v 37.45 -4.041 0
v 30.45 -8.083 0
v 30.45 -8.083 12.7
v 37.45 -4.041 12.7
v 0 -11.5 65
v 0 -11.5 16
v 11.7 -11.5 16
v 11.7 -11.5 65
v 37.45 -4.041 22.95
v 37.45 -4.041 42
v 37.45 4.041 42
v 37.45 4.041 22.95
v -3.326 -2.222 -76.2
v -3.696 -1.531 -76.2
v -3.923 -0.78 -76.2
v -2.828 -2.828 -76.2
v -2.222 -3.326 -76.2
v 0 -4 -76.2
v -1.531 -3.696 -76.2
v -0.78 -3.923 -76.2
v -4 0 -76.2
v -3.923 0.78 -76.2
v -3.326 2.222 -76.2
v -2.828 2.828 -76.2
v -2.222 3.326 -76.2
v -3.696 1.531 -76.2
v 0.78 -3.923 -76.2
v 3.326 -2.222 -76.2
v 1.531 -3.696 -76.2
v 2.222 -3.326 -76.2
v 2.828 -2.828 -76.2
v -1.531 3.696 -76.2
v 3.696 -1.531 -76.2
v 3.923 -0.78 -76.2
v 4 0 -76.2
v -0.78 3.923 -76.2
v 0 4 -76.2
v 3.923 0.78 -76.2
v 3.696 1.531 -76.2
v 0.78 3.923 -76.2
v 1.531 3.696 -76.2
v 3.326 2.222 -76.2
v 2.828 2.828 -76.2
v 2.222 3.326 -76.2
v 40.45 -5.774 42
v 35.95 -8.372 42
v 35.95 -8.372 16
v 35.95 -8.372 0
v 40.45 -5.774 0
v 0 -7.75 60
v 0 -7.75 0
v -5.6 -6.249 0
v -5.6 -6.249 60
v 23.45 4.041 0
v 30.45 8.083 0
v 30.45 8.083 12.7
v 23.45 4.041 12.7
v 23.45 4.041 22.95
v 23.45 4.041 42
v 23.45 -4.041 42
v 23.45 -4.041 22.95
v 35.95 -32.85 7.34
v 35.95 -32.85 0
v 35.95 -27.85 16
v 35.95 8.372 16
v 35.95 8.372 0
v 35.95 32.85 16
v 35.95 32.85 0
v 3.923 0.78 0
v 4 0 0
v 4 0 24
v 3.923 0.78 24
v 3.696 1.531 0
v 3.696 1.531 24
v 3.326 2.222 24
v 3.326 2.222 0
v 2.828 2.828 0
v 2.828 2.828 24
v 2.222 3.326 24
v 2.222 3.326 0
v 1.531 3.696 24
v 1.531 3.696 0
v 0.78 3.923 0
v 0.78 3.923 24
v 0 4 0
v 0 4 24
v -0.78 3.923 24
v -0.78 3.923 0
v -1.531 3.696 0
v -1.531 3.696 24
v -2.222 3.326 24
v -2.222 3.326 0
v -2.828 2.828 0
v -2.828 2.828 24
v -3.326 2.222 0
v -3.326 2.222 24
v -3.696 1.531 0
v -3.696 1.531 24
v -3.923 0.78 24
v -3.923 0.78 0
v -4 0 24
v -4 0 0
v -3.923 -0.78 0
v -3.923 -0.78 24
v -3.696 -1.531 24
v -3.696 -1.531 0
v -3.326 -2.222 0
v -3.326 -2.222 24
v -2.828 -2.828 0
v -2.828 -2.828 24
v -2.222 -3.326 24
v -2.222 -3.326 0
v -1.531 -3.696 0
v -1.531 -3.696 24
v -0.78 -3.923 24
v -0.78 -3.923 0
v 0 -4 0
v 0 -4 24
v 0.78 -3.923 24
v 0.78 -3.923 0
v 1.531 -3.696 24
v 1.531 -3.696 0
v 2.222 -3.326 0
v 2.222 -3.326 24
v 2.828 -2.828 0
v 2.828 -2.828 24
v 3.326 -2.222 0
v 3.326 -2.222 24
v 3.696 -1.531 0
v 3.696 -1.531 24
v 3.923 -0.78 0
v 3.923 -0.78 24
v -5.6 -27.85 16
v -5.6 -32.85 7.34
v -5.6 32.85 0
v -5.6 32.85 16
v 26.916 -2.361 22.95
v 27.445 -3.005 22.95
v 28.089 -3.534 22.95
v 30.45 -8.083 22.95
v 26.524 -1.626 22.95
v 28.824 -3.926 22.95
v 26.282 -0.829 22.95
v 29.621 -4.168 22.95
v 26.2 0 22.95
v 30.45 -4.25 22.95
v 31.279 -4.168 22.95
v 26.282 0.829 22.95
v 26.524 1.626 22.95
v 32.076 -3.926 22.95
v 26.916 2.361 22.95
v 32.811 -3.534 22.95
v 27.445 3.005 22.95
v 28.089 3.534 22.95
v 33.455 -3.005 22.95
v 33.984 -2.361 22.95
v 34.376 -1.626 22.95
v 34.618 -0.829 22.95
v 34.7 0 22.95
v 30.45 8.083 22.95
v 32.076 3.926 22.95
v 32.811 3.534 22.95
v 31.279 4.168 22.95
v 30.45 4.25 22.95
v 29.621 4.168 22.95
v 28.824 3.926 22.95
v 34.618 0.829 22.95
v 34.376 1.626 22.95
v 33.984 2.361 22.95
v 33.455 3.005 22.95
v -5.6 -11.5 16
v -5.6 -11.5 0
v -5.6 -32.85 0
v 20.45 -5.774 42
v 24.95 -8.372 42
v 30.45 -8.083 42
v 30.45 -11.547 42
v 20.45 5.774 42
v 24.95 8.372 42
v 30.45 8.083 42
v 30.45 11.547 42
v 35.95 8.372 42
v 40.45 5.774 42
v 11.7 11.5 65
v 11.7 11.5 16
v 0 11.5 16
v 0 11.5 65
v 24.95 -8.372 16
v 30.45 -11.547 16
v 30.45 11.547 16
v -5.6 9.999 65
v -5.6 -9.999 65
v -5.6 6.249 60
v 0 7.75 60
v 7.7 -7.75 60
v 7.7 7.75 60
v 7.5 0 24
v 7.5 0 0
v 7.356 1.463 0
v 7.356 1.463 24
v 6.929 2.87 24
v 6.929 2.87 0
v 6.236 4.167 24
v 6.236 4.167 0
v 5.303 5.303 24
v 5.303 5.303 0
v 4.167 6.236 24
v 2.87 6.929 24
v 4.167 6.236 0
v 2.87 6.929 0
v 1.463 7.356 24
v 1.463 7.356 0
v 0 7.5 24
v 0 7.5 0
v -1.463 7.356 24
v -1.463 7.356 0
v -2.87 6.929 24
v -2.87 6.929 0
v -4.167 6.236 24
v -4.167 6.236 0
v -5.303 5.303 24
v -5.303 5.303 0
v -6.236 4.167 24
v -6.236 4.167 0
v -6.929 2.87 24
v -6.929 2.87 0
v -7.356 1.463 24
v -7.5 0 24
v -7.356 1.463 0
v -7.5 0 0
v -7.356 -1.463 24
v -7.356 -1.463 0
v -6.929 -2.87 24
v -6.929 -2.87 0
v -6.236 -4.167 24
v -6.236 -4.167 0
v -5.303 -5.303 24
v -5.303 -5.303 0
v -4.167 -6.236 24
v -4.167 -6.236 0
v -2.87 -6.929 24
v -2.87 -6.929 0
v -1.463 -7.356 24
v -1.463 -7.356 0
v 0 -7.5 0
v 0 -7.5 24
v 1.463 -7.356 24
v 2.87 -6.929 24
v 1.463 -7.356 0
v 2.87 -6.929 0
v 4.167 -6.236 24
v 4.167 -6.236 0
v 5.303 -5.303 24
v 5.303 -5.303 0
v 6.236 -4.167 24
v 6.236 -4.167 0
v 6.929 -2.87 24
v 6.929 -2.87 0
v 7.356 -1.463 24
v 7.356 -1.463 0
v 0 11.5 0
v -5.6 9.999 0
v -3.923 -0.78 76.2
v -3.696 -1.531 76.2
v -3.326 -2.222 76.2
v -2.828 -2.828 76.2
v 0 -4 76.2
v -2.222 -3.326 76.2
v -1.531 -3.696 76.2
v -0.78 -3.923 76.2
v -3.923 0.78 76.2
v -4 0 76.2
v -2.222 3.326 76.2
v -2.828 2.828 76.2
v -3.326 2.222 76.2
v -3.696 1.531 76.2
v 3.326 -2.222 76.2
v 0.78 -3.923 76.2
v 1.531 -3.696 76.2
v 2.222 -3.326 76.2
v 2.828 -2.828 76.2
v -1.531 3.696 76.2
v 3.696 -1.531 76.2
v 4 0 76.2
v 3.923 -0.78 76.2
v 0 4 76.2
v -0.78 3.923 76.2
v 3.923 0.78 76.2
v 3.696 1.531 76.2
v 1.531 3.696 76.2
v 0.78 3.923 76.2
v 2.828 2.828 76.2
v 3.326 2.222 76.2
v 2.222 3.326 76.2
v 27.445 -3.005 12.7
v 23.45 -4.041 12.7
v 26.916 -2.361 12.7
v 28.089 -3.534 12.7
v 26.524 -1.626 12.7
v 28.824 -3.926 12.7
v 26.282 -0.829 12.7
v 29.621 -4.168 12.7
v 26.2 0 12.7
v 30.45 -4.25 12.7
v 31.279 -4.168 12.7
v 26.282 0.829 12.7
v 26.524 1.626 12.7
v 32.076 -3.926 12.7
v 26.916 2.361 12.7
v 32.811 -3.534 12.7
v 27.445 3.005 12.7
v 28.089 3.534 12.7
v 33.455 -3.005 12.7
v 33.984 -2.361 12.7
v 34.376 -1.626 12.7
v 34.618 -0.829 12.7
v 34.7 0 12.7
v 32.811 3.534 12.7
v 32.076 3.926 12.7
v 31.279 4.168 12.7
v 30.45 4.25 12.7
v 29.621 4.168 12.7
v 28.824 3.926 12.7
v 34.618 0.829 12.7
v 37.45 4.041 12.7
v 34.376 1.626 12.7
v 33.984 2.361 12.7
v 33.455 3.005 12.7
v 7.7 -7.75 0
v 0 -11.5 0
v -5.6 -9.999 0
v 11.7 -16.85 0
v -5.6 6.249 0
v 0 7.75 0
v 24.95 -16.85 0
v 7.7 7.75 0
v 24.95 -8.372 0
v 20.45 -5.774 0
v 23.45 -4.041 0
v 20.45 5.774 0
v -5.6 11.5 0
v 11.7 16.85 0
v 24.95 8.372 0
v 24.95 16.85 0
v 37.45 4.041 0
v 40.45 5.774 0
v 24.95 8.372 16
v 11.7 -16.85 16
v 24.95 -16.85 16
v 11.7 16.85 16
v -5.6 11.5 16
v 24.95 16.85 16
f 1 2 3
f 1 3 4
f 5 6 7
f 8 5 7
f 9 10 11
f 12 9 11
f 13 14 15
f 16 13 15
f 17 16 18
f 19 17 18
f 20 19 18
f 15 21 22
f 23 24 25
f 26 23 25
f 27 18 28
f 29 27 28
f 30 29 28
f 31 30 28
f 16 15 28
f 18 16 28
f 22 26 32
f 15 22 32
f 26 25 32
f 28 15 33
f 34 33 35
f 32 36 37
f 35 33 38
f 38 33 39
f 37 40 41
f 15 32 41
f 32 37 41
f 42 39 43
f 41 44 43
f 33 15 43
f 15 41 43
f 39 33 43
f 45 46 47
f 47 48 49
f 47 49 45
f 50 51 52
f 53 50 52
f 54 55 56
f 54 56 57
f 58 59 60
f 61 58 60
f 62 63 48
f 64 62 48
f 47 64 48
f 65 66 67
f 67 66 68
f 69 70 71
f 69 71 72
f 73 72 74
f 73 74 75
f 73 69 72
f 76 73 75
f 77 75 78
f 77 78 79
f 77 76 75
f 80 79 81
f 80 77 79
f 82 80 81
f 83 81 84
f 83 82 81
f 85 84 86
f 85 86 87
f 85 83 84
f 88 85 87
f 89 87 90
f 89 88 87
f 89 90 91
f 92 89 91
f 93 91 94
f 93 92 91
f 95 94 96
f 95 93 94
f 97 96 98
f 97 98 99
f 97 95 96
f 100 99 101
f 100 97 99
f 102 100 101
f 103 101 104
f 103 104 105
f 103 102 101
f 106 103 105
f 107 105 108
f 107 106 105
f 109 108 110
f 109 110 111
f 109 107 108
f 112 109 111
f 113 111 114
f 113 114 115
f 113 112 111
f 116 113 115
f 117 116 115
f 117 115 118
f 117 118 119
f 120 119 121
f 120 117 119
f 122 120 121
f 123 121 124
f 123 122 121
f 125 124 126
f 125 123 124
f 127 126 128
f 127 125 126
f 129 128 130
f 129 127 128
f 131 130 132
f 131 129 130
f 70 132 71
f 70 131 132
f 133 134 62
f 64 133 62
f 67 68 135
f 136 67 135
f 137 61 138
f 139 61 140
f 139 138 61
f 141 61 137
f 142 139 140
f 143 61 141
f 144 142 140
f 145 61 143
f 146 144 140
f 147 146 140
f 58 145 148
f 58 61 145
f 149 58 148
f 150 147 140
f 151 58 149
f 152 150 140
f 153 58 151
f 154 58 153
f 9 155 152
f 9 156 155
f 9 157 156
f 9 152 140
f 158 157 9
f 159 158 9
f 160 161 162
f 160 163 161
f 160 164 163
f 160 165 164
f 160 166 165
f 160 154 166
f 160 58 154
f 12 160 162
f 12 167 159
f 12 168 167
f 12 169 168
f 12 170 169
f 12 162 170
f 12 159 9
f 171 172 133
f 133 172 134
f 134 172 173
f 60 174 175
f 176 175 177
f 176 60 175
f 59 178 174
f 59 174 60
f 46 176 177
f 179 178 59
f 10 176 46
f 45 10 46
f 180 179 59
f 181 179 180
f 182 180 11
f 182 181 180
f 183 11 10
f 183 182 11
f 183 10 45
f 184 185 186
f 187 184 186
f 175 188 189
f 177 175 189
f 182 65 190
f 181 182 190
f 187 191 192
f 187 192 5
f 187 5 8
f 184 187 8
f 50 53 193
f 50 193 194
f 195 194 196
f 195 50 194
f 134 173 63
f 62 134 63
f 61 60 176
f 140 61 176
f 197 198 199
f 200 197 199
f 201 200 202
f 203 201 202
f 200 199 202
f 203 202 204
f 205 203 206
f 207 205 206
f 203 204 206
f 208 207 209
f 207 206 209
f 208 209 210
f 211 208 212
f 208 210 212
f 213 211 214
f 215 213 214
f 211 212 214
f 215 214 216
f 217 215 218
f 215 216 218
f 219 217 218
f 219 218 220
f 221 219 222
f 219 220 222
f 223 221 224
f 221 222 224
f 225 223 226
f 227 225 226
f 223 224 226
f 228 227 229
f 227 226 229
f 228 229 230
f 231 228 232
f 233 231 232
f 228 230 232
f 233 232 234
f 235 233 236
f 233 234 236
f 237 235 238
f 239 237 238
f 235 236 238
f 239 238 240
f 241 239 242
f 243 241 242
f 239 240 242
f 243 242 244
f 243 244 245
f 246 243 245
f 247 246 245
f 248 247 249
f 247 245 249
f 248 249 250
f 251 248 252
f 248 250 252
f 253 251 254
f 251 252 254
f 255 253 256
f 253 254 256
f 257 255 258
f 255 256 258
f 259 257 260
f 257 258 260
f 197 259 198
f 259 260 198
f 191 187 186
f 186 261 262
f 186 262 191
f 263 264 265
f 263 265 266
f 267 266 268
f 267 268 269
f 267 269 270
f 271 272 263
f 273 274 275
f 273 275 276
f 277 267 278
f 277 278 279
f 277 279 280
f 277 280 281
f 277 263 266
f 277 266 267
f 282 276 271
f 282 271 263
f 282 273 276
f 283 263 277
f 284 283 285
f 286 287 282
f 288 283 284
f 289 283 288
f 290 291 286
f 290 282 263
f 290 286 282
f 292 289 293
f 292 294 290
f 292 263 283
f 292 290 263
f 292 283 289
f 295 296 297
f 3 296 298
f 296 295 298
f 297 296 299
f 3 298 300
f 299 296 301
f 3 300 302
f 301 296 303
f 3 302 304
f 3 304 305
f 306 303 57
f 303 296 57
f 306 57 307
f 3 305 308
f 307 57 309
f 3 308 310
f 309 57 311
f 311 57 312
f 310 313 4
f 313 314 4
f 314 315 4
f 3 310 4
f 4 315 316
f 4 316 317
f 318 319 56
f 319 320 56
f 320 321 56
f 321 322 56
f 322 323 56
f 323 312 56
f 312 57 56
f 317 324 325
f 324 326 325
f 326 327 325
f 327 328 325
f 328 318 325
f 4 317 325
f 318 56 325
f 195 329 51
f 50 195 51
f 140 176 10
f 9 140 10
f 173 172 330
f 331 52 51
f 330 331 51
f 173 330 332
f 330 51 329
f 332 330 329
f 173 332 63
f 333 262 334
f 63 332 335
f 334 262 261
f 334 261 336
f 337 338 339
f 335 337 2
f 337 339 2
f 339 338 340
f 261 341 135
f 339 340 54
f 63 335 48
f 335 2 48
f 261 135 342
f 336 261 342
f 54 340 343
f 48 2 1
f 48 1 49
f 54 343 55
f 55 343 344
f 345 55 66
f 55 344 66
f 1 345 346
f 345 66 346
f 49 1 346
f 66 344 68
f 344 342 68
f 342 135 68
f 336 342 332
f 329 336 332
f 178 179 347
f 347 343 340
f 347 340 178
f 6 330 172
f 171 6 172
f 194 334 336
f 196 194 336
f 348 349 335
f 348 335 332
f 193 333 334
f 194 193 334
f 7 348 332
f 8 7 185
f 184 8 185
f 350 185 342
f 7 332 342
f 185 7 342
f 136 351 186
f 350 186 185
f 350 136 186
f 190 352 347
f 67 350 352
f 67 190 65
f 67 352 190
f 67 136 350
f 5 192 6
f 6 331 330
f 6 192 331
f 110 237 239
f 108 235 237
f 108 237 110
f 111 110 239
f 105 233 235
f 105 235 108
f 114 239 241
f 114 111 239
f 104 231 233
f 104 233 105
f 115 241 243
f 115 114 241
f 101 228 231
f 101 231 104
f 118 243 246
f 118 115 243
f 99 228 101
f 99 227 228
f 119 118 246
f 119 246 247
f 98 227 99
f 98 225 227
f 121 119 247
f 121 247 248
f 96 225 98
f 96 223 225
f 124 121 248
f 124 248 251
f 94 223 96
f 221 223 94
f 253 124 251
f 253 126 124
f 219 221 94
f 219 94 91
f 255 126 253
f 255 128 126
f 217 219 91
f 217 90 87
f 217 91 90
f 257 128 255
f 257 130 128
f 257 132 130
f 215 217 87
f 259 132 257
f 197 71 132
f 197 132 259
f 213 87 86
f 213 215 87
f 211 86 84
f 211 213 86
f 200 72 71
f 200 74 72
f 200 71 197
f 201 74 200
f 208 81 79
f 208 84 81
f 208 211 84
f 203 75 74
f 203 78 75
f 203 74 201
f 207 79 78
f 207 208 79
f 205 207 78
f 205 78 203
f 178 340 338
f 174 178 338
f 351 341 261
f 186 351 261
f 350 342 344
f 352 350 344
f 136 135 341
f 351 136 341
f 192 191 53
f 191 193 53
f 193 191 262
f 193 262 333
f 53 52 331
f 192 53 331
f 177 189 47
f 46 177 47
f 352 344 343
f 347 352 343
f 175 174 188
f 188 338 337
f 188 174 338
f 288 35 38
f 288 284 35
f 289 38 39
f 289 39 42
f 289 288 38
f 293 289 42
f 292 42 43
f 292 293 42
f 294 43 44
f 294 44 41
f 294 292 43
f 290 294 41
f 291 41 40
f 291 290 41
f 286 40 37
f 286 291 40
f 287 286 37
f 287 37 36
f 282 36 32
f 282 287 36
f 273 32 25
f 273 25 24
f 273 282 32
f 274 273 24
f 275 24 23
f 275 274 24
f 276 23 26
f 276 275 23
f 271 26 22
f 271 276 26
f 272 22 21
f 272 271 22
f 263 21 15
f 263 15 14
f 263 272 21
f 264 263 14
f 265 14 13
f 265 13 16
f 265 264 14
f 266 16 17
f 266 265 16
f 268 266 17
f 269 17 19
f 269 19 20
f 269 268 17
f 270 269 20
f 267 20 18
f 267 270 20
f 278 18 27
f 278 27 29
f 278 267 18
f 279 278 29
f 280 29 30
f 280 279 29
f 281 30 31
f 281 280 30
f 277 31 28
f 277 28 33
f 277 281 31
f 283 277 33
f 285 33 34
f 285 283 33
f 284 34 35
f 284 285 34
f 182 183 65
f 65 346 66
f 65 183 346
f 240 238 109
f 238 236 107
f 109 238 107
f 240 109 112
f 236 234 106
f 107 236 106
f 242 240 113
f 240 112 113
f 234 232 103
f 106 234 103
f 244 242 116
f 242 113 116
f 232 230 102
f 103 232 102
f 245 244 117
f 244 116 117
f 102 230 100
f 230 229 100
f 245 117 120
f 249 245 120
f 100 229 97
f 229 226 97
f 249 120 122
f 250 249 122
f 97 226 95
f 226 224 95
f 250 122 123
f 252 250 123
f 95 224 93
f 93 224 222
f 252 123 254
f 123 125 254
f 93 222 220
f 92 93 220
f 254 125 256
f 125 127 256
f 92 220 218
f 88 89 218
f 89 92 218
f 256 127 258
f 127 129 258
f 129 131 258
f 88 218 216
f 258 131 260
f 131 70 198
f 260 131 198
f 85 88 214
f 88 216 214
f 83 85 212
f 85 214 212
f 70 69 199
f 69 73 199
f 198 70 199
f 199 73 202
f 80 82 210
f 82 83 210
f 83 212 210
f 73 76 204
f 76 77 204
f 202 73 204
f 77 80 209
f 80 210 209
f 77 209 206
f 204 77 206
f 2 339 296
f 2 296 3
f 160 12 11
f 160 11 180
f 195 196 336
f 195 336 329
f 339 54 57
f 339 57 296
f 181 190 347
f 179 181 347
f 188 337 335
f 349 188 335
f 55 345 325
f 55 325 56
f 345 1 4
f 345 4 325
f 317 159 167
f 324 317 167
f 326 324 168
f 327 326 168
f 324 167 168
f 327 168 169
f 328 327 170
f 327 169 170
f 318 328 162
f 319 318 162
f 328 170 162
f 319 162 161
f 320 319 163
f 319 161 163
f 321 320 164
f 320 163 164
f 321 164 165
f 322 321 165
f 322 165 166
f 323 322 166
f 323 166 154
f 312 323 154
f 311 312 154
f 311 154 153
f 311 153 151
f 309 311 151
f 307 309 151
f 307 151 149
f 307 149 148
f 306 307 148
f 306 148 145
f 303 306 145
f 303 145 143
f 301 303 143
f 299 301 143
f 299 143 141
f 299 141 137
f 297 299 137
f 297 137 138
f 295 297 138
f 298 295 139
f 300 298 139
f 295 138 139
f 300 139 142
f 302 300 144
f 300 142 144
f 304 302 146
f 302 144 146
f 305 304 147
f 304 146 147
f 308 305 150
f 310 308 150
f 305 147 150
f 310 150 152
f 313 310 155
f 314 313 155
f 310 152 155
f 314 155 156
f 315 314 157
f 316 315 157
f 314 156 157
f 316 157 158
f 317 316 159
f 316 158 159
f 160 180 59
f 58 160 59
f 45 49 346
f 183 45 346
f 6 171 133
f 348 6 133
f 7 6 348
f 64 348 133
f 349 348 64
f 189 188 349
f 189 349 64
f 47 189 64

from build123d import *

# Parameters (mm, degrees)
F0_R      = 4
F1_DEPTH  = 76.2
F3_R      = 7.5
F3_R_2    = 4
F4_DEPTH  = 24
F5_DEPTH  = 65
F6_DEPTH  = 16
F7_DEPTH  = 42
F9_DEPTH  = 19.05
F11_DEPTH = 12.7
F12_R     = 4.25
F13_DEPTH = 99.151
F14_SIZE2 = 8.6602540378
F14_SIZE  = 5
F16_DEPTH = 60


with BuildPart() as f1:
    # F0 (on Top) → F1 (new body, symmetric)
    with BuildSketch(Plane.XY):
        Circle(F0_R)
    extrude(amount=F1_DEPTH, both=True)


with BuildPart() as f4:
    # F3 (on Top) → F4 (new body)
    with BuildSketch(Plane.XY):
        Circle(F3_R)
        Circle(F3_R_2, mode=Mode.SUBTRACT)
    extrude(amount=F4_DEPTH)


with BuildPart() as f5:
    # F2 (on Top) → F5 (new body)
    with BuildSketch(Plane.XY):
        Polygon((11.6998, 11.5), (0, 11.5), (-5.6002, 9.9994309325), (-5.6002, -9.9994309325), (0, -11.5), (11.6998, -11.5), align=None)
    extrude(amount=F5_DEPTH)

    # F2 (on Top) → F6 (join)
    with BuildSketch(Plane.XY):
        Polygon((11.6998, -16.85), (11.6998, -11.5), (0, -11.5), (-5.6002, -11.5), (-5.6002, -32.85), (35.95, -32.85), (35.95, -8.3715789032), (30.45, -11.5470053838), (24.95, -8.3715789032), (24.95, -16.85), align=None)
        Polygon((-5.6002, 11.5), (0, 11.5), (11.6998, 11.5), (11.6998, 16.85), (24.95, 16.85), (24.95, 8.3715789032), (30.45, 11.5470053838), (35.95, 8.3715789032), (35.95, 32.85), (-5.6002, 32.85), align=None)
        Polygon((30.45, 11.5470053838), (24.95, 8.3715789032), (35.95, 8.3715789032), align=None)
        Polygon((35.95, -8.3715789032), (24.95, -8.3715789032), (30.45, -11.5470053838), align=None)
    extrude(amount=F6_DEPTH)

    # F2 (on Top) → F7 (join)
    with BuildSketch(Plane.XY):
        Polygon((35.95, 8.3715789032), (24.95, 8.3715789032), (20.45, 5.7735026919), (20.45, -5.7735026919), (24.95, -8.3715789032), (35.95, -8.3715789032), (40.45, -5.7735026919), (40.45, 5.7735026919), align=None)
        Polygon((35.95, -8.3715789032), (24.95, -8.3715789032), (30.45, -11.5470053838), align=None)
        Polygon((30.45, 11.5470053838), (24.95, 8.3715789032), (35.95, 8.3715789032), align=None)
    extrude(amount=F7_DEPTH)

    # F8 (on face) → F9 (cut)
    with BuildSketch(Plane.XY.offset(42)):
        Polygon((30.45, -8.0829037687), (37.45, -4.0414518843), (37.45, 4.0414518843), (30.45, 8.0829037687), (23.45, 4.0414518843), (23.45, -4.0414518843), align=None)
    extrude(amount=-F9_DEPTH, mode=Mode.SUBTRACT)

    # F10 (on face) → F11 (cut)
    with BuildSketch(Plane.XY):
        Polygon((37.45, 4.0414518843), (30.45, 8.0829037687), (23.45, 4.0414518843), (23.45, -4.0414518843), (30.45, -8.0829037687), (37.45, -4.0414518843), align=None)
    extrude(amount=F11_DEPTH, mode=Mode.SUBTRACT)

    # F12 (on face) → F13 (cut, through all)
    with BuildSketch(Plane.XY.offset(22.95)):
        with Locations((30.45, 0)):
            Circle(F12_R)
    extrude(amount=-F13_DEPTH, mode=Mode.SUBTRACT)

    # F14
    f14_edges = [f5.edges().sort_by_distance(p)[0] for p in [
        (15.1749, -32.85, 16),
    ]]
    f14_side = f5.faces().sort_by_distance((15.217605, -22.61731, 16))[0]
    chamfer(f14_edges, length=F14_SIZE, length2=F14_SIZE2, reference=f14_side)

    # F15 (on face) → F16 (cut)
    with BuildSketch(Plane(origin=(0, 0, 0), x_dir=(1, 0, 0), z_dir=(0, 0, -1))):
        Polygon((-5.6002, 6.2494309325), (-5.6002, -6.2494309325), (0, -7.75), (7.6998, -7.75), (7.6998, 7.75), (0, 7.75), align=None)
    extrude(amount=-F16_DEPTH, mode=Mode.SUBTRACT)


solid = Compound([f1.part, f4.part, f5.part])
